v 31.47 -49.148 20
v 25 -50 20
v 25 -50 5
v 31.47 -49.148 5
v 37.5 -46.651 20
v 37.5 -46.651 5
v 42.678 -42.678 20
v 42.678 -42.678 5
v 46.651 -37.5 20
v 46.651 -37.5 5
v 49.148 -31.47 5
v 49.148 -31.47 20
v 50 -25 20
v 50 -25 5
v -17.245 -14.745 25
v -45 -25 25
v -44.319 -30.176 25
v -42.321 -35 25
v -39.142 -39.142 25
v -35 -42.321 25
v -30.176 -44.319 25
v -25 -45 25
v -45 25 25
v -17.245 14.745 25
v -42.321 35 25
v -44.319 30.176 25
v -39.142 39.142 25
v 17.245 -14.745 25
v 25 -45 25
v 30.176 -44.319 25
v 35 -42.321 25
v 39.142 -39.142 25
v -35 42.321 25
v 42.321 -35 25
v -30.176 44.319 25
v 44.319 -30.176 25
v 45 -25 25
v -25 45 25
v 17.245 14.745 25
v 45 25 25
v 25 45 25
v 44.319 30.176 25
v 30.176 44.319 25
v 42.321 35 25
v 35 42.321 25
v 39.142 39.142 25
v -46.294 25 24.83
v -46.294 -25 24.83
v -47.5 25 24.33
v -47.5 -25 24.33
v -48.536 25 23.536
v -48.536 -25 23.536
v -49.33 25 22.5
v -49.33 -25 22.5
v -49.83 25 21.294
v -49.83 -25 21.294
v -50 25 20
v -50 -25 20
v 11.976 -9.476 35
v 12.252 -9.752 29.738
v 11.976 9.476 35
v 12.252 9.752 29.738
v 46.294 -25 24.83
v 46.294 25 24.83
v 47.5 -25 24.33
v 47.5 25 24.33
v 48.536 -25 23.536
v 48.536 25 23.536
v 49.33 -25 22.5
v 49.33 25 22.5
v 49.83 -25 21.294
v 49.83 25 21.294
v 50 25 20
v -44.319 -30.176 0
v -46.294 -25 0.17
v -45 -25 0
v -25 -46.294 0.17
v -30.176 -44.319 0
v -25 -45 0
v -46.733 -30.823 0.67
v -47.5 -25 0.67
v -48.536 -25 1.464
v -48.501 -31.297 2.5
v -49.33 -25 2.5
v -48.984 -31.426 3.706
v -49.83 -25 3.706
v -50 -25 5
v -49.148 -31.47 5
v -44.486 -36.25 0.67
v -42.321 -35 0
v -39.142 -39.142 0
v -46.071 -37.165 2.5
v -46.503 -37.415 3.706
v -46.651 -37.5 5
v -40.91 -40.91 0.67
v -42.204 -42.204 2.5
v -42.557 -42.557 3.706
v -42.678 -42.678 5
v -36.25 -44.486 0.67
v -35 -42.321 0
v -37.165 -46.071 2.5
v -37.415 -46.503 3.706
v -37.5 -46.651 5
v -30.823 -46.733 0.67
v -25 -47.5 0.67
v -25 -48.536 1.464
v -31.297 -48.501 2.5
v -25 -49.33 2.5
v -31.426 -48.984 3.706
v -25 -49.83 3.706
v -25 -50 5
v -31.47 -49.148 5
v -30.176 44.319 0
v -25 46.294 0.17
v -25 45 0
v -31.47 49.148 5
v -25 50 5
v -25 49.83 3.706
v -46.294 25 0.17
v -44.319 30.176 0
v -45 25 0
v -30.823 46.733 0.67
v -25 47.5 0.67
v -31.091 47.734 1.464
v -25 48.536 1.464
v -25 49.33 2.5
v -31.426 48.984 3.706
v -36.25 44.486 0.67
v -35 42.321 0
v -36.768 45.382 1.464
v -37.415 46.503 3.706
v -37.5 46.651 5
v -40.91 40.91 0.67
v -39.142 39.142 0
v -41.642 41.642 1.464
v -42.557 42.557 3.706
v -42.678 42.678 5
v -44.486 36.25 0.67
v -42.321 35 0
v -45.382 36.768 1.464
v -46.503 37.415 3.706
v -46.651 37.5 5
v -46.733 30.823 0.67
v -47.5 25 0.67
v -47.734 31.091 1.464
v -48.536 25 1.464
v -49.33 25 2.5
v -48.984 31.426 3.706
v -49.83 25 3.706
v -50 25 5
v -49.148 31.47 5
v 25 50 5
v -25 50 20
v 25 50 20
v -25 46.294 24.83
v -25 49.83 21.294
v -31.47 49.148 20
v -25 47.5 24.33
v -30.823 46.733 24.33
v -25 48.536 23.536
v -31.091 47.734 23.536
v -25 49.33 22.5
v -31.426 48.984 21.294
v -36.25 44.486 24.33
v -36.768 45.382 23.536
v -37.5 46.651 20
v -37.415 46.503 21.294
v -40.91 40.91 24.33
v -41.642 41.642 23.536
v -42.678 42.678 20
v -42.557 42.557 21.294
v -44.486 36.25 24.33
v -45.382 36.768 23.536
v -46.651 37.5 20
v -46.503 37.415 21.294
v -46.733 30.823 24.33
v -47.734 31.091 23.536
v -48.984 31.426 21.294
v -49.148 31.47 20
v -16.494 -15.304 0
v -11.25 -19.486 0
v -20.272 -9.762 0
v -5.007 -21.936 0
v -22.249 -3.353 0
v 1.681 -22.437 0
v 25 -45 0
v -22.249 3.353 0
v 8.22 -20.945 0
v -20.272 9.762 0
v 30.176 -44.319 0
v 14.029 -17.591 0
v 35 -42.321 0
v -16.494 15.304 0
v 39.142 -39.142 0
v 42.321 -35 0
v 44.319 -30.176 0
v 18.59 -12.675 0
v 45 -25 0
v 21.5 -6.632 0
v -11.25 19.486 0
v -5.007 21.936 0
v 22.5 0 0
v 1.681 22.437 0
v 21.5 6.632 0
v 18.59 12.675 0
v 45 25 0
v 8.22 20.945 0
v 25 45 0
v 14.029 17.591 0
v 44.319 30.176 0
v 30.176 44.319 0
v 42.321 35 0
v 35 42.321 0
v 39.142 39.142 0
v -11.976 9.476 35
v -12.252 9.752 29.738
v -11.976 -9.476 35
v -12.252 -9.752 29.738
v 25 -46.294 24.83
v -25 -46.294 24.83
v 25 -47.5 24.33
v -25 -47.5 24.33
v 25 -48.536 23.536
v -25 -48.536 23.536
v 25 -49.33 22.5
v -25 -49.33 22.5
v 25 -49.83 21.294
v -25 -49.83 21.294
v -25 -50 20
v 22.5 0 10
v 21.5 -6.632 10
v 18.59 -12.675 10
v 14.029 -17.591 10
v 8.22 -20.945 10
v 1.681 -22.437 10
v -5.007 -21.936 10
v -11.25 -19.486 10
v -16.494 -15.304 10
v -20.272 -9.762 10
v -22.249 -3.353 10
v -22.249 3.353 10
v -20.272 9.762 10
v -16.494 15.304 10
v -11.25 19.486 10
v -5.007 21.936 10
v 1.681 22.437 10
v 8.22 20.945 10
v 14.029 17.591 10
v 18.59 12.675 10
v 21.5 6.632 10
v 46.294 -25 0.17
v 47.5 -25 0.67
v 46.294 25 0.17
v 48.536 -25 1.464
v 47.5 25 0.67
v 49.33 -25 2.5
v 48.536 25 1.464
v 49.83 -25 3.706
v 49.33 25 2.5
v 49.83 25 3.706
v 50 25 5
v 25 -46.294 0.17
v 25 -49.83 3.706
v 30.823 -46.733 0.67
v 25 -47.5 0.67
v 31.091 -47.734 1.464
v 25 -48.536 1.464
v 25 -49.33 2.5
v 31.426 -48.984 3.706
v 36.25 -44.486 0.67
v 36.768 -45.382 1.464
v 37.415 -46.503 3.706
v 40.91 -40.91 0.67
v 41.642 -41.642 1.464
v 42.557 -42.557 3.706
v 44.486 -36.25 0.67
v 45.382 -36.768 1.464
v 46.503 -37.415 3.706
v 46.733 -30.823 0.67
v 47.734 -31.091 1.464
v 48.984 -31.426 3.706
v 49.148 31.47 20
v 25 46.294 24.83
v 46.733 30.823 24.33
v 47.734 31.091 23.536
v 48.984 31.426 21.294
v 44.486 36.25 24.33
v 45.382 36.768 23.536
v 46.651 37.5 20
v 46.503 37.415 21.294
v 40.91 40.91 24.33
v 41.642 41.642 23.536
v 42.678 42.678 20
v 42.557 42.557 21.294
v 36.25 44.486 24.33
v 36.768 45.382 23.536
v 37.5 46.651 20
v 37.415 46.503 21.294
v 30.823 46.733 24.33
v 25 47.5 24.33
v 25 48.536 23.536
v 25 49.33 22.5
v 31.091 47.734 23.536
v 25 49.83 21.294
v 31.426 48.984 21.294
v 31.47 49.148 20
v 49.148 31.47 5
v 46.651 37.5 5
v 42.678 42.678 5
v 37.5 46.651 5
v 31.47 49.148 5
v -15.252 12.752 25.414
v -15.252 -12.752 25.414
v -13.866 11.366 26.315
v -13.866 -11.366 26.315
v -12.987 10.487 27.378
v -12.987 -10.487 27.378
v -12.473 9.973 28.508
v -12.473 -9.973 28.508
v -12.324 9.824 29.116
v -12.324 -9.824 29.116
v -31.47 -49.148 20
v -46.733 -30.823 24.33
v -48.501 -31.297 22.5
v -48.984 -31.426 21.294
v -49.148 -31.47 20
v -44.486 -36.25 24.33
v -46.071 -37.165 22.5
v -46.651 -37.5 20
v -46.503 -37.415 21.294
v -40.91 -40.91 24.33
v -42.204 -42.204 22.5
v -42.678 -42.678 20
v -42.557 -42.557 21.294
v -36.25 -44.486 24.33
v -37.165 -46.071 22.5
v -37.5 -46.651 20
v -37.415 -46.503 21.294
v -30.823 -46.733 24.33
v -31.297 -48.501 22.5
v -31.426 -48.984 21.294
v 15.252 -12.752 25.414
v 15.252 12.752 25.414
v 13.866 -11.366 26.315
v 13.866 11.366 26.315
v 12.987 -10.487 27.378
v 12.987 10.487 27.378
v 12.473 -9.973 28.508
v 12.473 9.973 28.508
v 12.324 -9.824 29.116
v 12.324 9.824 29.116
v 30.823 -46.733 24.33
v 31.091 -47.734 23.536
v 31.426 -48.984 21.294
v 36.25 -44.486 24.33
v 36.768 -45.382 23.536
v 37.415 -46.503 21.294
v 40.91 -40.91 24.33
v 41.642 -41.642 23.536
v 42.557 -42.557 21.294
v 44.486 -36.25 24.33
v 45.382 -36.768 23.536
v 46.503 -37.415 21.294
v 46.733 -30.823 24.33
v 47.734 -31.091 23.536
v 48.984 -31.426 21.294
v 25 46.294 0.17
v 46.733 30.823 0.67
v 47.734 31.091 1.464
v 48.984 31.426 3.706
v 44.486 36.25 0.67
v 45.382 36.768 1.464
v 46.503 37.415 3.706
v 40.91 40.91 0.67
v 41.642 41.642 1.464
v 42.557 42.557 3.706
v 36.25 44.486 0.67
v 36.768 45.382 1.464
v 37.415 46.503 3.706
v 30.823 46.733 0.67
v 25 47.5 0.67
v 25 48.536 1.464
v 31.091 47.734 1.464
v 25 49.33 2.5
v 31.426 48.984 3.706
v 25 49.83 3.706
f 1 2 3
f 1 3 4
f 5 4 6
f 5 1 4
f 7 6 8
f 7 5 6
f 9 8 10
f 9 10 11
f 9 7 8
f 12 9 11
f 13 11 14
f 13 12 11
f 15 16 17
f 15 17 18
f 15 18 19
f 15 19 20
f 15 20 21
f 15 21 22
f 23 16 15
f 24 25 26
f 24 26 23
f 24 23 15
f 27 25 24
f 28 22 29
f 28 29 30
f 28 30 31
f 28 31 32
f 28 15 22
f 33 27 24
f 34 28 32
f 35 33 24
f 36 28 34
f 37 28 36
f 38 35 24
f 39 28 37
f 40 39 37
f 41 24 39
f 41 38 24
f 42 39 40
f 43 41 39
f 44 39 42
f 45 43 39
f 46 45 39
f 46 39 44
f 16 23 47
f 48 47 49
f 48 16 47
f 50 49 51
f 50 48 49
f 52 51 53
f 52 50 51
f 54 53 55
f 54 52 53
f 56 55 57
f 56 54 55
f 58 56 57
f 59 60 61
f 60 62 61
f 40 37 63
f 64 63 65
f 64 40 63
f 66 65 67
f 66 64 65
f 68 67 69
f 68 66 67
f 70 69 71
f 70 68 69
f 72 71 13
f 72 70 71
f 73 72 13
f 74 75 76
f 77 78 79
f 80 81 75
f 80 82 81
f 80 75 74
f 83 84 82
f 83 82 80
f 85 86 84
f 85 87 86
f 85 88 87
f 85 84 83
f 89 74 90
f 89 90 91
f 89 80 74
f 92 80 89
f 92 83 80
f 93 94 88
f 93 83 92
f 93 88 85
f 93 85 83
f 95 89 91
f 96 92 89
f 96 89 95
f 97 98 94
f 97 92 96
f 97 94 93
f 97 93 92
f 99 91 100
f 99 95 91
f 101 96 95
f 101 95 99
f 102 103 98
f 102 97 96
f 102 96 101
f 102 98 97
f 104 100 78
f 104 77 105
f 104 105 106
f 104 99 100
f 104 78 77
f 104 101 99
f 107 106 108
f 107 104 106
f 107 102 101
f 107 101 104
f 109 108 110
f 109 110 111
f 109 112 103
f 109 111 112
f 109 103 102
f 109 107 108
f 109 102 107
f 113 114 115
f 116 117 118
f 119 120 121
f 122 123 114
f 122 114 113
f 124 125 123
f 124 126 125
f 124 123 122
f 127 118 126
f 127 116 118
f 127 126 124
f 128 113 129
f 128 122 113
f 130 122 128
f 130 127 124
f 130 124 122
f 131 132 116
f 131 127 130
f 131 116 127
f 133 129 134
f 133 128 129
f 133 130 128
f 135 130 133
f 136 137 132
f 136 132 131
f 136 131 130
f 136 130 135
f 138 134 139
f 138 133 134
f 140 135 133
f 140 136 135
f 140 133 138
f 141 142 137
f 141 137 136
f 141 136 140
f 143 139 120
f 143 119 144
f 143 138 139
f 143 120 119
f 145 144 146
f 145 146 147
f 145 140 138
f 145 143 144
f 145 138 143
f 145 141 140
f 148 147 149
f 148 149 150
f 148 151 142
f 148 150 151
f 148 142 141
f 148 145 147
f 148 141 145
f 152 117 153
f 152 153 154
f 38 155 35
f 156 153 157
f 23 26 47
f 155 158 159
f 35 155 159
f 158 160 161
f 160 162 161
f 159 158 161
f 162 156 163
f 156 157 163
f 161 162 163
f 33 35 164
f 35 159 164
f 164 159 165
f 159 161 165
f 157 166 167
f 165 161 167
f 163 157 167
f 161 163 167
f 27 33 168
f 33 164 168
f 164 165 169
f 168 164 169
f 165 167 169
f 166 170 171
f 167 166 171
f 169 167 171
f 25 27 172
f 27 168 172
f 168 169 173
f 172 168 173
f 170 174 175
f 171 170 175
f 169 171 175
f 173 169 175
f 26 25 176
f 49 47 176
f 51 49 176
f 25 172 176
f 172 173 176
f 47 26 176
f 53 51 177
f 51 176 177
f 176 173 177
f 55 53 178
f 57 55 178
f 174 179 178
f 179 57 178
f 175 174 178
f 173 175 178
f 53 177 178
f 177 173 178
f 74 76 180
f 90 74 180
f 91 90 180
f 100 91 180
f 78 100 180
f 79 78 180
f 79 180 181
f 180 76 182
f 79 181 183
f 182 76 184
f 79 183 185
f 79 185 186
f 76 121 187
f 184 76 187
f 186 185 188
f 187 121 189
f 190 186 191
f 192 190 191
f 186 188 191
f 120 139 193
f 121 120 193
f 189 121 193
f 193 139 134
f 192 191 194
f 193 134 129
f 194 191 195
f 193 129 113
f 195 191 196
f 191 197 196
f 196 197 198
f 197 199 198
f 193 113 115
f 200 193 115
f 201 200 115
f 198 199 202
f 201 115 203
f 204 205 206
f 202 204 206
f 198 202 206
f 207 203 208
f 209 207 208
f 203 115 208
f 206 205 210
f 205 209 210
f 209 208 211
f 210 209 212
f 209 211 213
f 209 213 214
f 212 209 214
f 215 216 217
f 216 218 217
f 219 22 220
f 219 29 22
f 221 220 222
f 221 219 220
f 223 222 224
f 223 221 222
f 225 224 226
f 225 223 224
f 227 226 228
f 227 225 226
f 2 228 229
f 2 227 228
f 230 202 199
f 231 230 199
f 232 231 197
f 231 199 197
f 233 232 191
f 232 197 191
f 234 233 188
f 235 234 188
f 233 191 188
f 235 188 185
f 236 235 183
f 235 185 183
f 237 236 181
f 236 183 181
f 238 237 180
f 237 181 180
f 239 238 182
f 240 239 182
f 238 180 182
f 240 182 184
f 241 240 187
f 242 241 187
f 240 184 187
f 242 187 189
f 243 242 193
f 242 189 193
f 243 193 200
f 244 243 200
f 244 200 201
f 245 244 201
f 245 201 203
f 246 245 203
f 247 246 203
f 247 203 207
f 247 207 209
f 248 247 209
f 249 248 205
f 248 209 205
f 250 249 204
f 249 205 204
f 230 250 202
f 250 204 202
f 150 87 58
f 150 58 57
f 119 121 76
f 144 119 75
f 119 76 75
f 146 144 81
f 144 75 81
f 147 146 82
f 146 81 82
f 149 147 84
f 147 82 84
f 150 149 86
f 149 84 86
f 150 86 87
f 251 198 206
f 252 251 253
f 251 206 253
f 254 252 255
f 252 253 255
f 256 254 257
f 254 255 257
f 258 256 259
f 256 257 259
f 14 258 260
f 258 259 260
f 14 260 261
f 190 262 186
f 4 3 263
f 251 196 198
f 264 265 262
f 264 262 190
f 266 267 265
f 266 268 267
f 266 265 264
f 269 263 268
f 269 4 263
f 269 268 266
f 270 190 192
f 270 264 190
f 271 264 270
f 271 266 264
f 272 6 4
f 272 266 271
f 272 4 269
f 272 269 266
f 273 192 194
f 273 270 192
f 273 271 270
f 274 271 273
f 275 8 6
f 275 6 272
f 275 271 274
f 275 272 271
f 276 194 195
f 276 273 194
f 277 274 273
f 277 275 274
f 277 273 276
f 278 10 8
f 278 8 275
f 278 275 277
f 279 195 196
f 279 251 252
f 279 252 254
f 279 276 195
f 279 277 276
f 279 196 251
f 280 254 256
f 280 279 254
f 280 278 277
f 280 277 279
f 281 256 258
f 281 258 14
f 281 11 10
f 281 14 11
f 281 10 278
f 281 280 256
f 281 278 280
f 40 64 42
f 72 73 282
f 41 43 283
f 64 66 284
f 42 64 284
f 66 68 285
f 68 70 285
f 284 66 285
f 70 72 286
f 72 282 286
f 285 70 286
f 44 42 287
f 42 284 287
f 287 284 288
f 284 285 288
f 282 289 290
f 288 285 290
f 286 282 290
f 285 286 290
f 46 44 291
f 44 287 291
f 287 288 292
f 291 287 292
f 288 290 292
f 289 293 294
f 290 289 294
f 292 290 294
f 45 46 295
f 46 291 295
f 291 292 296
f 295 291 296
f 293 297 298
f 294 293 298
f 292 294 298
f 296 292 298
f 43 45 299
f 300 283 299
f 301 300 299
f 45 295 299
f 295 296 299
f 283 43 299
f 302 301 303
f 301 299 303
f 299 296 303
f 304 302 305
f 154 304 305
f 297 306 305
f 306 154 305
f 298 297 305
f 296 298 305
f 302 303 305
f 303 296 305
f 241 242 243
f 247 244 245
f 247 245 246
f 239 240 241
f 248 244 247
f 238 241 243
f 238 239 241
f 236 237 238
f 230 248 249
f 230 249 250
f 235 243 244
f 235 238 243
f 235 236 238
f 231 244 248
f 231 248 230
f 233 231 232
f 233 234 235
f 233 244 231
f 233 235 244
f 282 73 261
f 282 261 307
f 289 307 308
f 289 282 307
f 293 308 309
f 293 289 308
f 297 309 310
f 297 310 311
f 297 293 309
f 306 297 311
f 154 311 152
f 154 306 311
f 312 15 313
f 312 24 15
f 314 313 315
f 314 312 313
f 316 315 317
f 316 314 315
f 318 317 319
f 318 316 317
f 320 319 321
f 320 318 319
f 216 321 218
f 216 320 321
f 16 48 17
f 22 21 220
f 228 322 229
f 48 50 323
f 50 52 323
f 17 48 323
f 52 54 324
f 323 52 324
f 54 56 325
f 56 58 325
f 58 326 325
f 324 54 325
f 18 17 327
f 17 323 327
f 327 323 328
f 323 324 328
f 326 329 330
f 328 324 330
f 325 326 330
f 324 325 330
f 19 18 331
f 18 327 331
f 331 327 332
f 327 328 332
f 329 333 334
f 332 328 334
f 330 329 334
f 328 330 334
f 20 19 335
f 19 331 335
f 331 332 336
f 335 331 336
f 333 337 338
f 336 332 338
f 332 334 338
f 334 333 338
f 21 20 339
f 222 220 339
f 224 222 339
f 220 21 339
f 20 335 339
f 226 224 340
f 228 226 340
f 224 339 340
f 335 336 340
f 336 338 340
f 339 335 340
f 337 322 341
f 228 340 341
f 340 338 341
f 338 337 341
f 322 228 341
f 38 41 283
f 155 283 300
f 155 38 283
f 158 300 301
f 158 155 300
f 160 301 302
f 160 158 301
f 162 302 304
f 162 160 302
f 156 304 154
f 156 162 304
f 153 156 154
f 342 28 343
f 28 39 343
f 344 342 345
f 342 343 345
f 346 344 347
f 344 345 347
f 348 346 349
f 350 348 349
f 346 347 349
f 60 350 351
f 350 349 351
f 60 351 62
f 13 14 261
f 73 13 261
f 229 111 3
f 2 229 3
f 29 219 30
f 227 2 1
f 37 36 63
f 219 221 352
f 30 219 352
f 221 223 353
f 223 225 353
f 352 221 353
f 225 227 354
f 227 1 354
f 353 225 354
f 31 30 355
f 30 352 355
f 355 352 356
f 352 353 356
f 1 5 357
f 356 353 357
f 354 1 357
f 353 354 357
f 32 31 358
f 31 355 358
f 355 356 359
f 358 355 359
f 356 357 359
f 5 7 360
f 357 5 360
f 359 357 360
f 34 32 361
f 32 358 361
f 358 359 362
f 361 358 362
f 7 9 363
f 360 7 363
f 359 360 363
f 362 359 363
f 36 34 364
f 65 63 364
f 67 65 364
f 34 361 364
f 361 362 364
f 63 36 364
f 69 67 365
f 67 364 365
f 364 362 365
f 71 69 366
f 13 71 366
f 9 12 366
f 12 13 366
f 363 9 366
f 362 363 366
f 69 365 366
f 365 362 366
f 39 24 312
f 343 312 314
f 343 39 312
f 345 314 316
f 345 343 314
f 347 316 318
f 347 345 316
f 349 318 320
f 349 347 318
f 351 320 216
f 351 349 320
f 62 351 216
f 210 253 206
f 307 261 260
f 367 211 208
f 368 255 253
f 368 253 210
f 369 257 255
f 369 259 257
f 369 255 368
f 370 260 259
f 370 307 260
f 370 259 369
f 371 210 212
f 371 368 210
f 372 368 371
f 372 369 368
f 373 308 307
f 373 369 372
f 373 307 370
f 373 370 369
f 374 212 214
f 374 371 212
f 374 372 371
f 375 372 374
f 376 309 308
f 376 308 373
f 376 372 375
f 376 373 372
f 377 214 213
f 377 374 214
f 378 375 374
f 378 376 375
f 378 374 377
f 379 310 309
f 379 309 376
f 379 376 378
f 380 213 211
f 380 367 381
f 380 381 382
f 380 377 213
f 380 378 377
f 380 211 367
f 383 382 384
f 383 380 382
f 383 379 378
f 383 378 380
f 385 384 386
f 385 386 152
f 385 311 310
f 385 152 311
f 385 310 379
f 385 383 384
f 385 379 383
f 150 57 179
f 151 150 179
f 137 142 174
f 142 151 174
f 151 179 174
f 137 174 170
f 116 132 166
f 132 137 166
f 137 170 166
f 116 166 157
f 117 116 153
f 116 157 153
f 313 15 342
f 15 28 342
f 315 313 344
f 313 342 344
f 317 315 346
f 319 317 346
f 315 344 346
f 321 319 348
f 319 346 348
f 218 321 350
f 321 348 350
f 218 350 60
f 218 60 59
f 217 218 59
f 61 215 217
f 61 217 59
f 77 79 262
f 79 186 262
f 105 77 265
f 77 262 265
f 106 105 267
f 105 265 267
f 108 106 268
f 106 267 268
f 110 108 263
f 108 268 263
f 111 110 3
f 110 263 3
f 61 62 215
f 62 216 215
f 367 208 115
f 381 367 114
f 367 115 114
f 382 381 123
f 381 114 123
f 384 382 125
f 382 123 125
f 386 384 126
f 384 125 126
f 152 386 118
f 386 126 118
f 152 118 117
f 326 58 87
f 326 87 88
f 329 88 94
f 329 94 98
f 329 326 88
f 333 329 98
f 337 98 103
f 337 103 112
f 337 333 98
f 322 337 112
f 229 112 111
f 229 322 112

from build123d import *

# Parameters (mm, degrees)
F1_W     = 100
F1_H     = 100
F2_DEPTH = 25
F3_R     = 25
F4_R     = 5
F5_W     = 25
F5_H     = 20
F6_DEPTH = 10
F6_TAPER = 3
F7_R     = 5
F8_R     = 22.5
F9_DEPTH = 10


with BuildPart() as f2:
    # F1 (on Top) → F2 (new body)
    with BuildSketch(Plane.XY):
        Rectangle(F1_W, F1_H)
    extrude(amount=F2_DEPTH)

    # F3
    f3_edges = [f2.edges().sort_by_distance(p)[0] for p in [
        (50, -50, 12.5),
        (-50, -50, 12.5),
        (-50, 50, 12.5),
        (50, 50, 12.5),
    ]]
    fillet(f3_edges, radius=F3_R)

    # F4
    f4_edges = [f2.edges().sort_by_distance(p)[0] for p in [
        (0, -50, 25),
        (-42.67767, -42.67767, 25),
        (42.67767, -42.67767, 25),
        (-50, 0, 25),
        (50, 0, 25),
        (-42.67767, 42.67767, 25),
        (42.67767, 42.67767, 25),
        (0, 50, 25),
        (0, -50, 0),
        (-42.67767, -42.67767, 0),
        (42.67767, -42.67767, 0),
        (-50, 0, 0),
        (50, 0, 0),
        (-42.67767, 42.67767, 0),
        (42.67767, 42.67767, 0),
        (0, 50, 0),
    ]]
    fillet(f4_edges, radius=F4_R)

    # F5 (on face) → F6 (join)
    with BuildSketch(Plane.XY.offset(25)):
        Rectangle(F5_W, F5_H)
    extrude(amount=F6_DEPTH, taper=F6_TAPER)

    # F7
    f7_edges = [f2.edges().sort_by_distance(p)[0] for p in [
        (0, -45, 25),
        (-39.142136, -39.142136, 25),
        (39.142136, -39.142136, 25),
        (-45, 0, 25),
        (45, 0, 25),
        (-39.142136, 39.142136, 25),
        (39.142136, 39.142136, 25),
        (0, 45, 25),
        (12.5, 0, 25),
        (0, 10, 25),
        (-12.5, 0, 25),
        (0, -10, 25),
    ]]
    fillet(f7_edges, radius=F7_R)

    # F8 (on face) → F9 (cut)
    with BuildSketch(Plane(origin=(0, 0, 0), x_dir=(1, 0, 0), z_dir=(0, 0, -1))):
        Circle(F8_R)
    extrude(amount=-F9_DEPTH, mode=Mode.SUBTRACT)


solid = f2.part
